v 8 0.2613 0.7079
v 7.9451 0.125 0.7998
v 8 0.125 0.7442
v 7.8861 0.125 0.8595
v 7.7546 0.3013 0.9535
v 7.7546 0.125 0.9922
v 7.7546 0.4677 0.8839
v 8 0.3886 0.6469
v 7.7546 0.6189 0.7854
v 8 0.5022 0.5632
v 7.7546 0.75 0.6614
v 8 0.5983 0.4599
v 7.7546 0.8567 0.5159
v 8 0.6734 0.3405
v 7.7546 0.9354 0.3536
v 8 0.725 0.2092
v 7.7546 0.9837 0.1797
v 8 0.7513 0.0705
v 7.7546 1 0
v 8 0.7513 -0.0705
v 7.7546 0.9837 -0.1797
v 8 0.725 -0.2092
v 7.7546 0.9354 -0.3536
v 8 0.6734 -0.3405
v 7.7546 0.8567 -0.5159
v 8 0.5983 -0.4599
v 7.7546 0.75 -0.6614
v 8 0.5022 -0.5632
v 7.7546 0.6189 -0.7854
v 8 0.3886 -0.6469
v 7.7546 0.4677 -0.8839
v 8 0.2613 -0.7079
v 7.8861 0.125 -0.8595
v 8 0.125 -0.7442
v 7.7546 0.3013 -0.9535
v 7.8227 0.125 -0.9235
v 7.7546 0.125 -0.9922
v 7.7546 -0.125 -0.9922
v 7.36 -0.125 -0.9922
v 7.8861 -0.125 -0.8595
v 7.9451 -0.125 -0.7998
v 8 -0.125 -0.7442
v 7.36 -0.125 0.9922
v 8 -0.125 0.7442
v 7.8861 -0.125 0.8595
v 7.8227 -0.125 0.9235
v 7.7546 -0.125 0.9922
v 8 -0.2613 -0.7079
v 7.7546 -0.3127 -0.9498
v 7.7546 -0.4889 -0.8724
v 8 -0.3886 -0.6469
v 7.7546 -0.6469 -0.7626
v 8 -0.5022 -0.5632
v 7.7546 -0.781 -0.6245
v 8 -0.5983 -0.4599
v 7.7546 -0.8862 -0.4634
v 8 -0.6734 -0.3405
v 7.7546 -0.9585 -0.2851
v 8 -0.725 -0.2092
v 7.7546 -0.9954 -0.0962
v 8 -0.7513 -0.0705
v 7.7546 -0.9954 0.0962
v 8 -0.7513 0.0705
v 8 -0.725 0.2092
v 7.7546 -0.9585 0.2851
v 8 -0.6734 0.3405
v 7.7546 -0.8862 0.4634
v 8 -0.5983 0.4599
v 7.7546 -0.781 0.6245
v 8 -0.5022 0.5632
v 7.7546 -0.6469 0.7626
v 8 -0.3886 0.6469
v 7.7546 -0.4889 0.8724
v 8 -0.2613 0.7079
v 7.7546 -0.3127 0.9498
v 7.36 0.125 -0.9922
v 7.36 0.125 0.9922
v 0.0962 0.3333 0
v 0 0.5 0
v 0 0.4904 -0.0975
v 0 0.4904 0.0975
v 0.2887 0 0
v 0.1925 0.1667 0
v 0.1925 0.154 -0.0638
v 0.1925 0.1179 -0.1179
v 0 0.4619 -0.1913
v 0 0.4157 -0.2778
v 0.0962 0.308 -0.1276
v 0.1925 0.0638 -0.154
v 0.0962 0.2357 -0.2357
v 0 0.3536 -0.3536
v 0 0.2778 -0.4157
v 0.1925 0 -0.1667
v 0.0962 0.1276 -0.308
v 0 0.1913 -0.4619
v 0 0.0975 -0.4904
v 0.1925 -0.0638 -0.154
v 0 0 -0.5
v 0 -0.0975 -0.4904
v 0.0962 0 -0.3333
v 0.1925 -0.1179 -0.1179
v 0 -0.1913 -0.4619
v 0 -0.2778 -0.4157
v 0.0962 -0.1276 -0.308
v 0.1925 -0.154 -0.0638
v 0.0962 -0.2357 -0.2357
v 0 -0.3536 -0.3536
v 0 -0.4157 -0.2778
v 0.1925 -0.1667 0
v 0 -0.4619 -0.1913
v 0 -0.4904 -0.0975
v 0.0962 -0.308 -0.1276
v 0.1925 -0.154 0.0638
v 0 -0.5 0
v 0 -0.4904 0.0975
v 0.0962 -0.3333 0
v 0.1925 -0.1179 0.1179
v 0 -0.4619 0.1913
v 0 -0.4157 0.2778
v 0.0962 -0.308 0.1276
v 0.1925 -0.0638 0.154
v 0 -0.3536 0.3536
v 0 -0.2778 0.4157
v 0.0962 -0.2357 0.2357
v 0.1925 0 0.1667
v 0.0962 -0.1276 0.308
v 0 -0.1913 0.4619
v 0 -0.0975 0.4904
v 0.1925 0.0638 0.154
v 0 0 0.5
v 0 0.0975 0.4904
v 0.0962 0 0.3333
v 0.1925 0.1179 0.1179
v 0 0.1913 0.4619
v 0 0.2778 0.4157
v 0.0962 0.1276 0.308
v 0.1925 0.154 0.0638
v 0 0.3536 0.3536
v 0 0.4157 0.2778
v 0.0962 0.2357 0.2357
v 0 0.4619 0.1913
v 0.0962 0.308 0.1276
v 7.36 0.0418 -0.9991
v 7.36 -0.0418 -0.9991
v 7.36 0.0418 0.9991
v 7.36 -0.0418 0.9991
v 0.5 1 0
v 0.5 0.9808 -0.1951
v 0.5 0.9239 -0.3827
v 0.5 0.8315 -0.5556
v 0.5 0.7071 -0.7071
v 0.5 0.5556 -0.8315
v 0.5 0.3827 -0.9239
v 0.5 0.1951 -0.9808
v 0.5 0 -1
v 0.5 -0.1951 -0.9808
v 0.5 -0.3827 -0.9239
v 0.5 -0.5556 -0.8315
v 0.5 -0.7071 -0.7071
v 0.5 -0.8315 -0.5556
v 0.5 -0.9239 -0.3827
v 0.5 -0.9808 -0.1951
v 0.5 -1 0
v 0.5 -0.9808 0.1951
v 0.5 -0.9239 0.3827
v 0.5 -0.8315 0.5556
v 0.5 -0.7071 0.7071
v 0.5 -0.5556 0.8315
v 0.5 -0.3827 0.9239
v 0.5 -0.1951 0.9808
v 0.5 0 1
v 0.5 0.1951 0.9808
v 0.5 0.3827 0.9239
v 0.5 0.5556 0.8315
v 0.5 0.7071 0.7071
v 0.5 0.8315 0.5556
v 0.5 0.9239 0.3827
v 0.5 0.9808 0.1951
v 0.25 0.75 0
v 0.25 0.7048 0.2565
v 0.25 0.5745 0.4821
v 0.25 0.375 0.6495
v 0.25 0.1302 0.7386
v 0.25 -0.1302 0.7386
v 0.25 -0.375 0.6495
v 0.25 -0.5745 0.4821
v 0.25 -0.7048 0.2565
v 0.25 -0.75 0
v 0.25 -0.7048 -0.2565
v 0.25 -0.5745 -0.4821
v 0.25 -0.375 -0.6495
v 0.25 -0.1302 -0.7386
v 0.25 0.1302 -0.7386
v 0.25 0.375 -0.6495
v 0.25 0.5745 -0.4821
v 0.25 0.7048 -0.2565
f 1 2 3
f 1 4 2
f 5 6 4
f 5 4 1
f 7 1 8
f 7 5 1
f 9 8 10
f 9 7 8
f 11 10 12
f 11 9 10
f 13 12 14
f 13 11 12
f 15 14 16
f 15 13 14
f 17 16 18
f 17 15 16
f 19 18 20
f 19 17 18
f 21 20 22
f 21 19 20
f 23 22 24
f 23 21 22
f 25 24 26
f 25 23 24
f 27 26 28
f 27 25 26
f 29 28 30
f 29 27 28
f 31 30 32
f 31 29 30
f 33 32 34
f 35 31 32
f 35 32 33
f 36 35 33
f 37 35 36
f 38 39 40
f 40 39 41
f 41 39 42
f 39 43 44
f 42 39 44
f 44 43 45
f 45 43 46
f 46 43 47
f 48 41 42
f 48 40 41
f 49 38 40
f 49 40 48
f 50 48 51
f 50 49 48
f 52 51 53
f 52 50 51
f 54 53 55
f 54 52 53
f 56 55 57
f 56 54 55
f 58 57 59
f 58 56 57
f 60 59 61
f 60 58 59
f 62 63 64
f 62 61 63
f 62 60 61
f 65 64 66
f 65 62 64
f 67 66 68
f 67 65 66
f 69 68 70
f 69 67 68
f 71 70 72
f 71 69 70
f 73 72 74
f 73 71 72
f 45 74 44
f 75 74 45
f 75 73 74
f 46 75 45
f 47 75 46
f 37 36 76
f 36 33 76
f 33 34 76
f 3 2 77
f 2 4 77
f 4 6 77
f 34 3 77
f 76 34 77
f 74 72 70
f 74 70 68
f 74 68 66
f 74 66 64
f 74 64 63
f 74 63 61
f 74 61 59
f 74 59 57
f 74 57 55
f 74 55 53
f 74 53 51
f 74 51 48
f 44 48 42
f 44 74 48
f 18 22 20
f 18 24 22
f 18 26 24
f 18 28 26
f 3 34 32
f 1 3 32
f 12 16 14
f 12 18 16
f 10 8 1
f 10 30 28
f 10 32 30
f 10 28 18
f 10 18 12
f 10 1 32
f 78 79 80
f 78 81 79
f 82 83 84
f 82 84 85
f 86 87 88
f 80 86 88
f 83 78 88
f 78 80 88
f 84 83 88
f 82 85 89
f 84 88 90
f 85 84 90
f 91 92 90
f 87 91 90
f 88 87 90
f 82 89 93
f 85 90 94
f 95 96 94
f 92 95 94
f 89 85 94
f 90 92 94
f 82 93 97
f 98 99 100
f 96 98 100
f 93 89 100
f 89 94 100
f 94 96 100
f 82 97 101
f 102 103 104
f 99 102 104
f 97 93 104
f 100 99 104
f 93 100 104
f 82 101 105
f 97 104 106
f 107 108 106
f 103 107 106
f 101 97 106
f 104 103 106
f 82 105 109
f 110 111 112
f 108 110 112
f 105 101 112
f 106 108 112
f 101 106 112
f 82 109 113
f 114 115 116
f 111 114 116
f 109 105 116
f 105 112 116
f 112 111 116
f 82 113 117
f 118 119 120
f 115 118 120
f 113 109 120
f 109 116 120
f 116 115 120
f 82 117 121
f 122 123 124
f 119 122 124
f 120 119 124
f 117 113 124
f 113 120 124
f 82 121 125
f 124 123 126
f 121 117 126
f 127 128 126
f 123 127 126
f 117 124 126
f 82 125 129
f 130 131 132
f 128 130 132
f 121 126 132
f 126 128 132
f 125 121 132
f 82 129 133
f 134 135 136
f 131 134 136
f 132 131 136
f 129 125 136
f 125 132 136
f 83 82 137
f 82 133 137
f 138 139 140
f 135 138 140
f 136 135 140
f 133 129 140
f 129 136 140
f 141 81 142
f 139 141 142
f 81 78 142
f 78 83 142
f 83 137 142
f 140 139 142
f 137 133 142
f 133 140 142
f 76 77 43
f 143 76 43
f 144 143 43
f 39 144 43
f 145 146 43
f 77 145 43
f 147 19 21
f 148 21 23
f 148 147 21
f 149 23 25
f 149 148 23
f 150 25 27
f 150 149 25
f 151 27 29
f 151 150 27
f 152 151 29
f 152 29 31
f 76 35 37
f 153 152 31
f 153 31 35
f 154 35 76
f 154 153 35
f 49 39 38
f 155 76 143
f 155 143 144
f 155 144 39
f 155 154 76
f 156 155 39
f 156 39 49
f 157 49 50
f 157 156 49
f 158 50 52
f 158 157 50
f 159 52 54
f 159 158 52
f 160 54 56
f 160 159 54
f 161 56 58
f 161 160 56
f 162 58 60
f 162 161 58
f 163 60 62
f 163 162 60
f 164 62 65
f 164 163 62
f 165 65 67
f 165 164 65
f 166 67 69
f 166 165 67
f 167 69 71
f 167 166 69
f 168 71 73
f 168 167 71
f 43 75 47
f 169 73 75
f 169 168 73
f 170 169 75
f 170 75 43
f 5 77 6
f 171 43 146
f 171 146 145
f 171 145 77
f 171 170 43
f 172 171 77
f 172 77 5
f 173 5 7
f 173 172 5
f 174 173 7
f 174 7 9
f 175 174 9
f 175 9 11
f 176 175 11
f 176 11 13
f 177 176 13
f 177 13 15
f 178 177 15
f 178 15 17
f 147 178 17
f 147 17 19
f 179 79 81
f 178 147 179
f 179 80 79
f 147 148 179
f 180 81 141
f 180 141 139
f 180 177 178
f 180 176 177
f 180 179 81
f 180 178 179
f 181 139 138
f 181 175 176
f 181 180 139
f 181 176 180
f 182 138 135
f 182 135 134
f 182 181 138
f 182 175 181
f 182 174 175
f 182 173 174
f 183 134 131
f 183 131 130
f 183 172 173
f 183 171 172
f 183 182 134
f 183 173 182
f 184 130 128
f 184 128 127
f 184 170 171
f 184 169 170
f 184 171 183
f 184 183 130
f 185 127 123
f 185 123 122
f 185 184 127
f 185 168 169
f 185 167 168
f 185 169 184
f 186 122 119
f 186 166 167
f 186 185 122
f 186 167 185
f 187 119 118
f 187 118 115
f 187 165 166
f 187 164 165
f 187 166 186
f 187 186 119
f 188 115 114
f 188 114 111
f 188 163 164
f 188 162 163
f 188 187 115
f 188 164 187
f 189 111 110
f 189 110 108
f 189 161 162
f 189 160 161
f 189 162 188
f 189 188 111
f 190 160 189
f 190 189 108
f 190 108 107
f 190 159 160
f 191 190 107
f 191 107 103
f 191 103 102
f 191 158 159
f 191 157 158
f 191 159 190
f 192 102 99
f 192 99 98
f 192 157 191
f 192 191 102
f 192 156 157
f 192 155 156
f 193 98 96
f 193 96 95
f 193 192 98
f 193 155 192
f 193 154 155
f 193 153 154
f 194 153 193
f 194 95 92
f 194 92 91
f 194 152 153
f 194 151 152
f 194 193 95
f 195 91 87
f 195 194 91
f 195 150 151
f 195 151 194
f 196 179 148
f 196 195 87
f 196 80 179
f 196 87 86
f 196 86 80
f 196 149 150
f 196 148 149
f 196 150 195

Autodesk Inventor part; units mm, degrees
ref_plane "YZ Plane" through (0, 0, 0) normal (1, 0, 0) x (0, 1, 0)
ref_plane "XZ Plane" through (0, 0, 0) normal (0, 1, 0) x (-1, 0, 0)
sketch "Sketch1" plane through (0, 0, 0) normal (0, 0, 1) x (1, 0, 0)
  line L0 (0, 0) -> (8, 0)
  line L1 (8, 0) -> (8, 1)
  line L2 (8, 1) -> (0.5, 1)
  line L3 (0.5, 1) -> (0, 0.5)
  line L4 (0, -0.2) -> (0, 1.2) projected
  line L5 (0, 0.5) -> (0.2887, 0)
  line L6 (0, 1.2) -> (0, -0.2) projected
  dimension "d0" = 2
  dimension "d2" = 8
  dimension "d3" = 45
  dimension "d4" = 1
  dimension "d14" = 60
revolve "Body" add sketch "Sketch1" angle 360 about axis through (0, 0, 0) along (1, 0, 0) contours L5 L3 L2 L1 L0
chamfer "Chamfer1" distance 0.2454 angle 45 1 edges at (8, -1, 0) measured on face at (8, 0.2495, 0.221)
sketch "Sketch2" plane through (0, 0, 0) normal (0, 0, 1) x (1, 0, 0)
  line L0 (8, 0.7546) -> (8, -0.7546) projected
  line L1 (7.232, 0) -> (8.128, 0) projected
  line L2 (8, 0.125) -> (7.36, 0.125)
  line L3 (7.36, 0.125) -> (7.36, 0)
  line L4 (7.36, -0.125) -> (7.36, 0)
  line L5 (7.36, -0.125) -> (8, -0.125)
  dimension "d10" = 0.125
  dimension "d11" = 0.64
extrude "Slot" cut sketch "Sketch2" against normal mid plane 2
thread "Thread" size "M2x0.4" class "6g" standard "ISO Metric profile" length 8
ref_plane "Work Plane1" through (4.25, 0, 0) normal (0, 0, -1) x (1, 0, 0)
equation "\"d10\" = 0.5 * SBR"
equation "\"d11\" = STI"
equation "\"d12\" = NND"
equation "\"d5\" = -0.5 * GD1 + 0.5 * NND"
equation "\"d7\" = FAWI"
equation "\"d34\" = -0.5 * GD1 + 0.5 * NND"
equation "\"d8\" = NLG"
equation "\"d0\" = NND"
equation "\"d2\" = NLG"
equation "\"d3\" = FAWI1"
equation "\"d4\" = SPD"
equation "\"d14\" = 0.5 * ANG"
equation "\"NND\" = 2"
equation "\"NLG\" = 8"
equation "\"FAWI\" = 45deg"
equation "\"GD1\" = THREADDIA - 1.2269 * PTC"
equation "\"FAWI1\" = 45deg"
equation "\"SPD\" = 1"
equation "\"SBR\" = 0.25"
equation "\"STI\" = 0.64"
equation "\"ANG\" = 120deg"
equation "\"GUL\" = 0.61345 * PTC"
equation "\"THREADDIA\" = 2"
equation "\"TOA\" = 30deg"
equation "\"PTC\" = 0.4"
equation "\"GAL\" = 0.61345 * PTC"
properties part number "ISO 7436 - M2 x 8" material "Stainless Steel, 440C"
